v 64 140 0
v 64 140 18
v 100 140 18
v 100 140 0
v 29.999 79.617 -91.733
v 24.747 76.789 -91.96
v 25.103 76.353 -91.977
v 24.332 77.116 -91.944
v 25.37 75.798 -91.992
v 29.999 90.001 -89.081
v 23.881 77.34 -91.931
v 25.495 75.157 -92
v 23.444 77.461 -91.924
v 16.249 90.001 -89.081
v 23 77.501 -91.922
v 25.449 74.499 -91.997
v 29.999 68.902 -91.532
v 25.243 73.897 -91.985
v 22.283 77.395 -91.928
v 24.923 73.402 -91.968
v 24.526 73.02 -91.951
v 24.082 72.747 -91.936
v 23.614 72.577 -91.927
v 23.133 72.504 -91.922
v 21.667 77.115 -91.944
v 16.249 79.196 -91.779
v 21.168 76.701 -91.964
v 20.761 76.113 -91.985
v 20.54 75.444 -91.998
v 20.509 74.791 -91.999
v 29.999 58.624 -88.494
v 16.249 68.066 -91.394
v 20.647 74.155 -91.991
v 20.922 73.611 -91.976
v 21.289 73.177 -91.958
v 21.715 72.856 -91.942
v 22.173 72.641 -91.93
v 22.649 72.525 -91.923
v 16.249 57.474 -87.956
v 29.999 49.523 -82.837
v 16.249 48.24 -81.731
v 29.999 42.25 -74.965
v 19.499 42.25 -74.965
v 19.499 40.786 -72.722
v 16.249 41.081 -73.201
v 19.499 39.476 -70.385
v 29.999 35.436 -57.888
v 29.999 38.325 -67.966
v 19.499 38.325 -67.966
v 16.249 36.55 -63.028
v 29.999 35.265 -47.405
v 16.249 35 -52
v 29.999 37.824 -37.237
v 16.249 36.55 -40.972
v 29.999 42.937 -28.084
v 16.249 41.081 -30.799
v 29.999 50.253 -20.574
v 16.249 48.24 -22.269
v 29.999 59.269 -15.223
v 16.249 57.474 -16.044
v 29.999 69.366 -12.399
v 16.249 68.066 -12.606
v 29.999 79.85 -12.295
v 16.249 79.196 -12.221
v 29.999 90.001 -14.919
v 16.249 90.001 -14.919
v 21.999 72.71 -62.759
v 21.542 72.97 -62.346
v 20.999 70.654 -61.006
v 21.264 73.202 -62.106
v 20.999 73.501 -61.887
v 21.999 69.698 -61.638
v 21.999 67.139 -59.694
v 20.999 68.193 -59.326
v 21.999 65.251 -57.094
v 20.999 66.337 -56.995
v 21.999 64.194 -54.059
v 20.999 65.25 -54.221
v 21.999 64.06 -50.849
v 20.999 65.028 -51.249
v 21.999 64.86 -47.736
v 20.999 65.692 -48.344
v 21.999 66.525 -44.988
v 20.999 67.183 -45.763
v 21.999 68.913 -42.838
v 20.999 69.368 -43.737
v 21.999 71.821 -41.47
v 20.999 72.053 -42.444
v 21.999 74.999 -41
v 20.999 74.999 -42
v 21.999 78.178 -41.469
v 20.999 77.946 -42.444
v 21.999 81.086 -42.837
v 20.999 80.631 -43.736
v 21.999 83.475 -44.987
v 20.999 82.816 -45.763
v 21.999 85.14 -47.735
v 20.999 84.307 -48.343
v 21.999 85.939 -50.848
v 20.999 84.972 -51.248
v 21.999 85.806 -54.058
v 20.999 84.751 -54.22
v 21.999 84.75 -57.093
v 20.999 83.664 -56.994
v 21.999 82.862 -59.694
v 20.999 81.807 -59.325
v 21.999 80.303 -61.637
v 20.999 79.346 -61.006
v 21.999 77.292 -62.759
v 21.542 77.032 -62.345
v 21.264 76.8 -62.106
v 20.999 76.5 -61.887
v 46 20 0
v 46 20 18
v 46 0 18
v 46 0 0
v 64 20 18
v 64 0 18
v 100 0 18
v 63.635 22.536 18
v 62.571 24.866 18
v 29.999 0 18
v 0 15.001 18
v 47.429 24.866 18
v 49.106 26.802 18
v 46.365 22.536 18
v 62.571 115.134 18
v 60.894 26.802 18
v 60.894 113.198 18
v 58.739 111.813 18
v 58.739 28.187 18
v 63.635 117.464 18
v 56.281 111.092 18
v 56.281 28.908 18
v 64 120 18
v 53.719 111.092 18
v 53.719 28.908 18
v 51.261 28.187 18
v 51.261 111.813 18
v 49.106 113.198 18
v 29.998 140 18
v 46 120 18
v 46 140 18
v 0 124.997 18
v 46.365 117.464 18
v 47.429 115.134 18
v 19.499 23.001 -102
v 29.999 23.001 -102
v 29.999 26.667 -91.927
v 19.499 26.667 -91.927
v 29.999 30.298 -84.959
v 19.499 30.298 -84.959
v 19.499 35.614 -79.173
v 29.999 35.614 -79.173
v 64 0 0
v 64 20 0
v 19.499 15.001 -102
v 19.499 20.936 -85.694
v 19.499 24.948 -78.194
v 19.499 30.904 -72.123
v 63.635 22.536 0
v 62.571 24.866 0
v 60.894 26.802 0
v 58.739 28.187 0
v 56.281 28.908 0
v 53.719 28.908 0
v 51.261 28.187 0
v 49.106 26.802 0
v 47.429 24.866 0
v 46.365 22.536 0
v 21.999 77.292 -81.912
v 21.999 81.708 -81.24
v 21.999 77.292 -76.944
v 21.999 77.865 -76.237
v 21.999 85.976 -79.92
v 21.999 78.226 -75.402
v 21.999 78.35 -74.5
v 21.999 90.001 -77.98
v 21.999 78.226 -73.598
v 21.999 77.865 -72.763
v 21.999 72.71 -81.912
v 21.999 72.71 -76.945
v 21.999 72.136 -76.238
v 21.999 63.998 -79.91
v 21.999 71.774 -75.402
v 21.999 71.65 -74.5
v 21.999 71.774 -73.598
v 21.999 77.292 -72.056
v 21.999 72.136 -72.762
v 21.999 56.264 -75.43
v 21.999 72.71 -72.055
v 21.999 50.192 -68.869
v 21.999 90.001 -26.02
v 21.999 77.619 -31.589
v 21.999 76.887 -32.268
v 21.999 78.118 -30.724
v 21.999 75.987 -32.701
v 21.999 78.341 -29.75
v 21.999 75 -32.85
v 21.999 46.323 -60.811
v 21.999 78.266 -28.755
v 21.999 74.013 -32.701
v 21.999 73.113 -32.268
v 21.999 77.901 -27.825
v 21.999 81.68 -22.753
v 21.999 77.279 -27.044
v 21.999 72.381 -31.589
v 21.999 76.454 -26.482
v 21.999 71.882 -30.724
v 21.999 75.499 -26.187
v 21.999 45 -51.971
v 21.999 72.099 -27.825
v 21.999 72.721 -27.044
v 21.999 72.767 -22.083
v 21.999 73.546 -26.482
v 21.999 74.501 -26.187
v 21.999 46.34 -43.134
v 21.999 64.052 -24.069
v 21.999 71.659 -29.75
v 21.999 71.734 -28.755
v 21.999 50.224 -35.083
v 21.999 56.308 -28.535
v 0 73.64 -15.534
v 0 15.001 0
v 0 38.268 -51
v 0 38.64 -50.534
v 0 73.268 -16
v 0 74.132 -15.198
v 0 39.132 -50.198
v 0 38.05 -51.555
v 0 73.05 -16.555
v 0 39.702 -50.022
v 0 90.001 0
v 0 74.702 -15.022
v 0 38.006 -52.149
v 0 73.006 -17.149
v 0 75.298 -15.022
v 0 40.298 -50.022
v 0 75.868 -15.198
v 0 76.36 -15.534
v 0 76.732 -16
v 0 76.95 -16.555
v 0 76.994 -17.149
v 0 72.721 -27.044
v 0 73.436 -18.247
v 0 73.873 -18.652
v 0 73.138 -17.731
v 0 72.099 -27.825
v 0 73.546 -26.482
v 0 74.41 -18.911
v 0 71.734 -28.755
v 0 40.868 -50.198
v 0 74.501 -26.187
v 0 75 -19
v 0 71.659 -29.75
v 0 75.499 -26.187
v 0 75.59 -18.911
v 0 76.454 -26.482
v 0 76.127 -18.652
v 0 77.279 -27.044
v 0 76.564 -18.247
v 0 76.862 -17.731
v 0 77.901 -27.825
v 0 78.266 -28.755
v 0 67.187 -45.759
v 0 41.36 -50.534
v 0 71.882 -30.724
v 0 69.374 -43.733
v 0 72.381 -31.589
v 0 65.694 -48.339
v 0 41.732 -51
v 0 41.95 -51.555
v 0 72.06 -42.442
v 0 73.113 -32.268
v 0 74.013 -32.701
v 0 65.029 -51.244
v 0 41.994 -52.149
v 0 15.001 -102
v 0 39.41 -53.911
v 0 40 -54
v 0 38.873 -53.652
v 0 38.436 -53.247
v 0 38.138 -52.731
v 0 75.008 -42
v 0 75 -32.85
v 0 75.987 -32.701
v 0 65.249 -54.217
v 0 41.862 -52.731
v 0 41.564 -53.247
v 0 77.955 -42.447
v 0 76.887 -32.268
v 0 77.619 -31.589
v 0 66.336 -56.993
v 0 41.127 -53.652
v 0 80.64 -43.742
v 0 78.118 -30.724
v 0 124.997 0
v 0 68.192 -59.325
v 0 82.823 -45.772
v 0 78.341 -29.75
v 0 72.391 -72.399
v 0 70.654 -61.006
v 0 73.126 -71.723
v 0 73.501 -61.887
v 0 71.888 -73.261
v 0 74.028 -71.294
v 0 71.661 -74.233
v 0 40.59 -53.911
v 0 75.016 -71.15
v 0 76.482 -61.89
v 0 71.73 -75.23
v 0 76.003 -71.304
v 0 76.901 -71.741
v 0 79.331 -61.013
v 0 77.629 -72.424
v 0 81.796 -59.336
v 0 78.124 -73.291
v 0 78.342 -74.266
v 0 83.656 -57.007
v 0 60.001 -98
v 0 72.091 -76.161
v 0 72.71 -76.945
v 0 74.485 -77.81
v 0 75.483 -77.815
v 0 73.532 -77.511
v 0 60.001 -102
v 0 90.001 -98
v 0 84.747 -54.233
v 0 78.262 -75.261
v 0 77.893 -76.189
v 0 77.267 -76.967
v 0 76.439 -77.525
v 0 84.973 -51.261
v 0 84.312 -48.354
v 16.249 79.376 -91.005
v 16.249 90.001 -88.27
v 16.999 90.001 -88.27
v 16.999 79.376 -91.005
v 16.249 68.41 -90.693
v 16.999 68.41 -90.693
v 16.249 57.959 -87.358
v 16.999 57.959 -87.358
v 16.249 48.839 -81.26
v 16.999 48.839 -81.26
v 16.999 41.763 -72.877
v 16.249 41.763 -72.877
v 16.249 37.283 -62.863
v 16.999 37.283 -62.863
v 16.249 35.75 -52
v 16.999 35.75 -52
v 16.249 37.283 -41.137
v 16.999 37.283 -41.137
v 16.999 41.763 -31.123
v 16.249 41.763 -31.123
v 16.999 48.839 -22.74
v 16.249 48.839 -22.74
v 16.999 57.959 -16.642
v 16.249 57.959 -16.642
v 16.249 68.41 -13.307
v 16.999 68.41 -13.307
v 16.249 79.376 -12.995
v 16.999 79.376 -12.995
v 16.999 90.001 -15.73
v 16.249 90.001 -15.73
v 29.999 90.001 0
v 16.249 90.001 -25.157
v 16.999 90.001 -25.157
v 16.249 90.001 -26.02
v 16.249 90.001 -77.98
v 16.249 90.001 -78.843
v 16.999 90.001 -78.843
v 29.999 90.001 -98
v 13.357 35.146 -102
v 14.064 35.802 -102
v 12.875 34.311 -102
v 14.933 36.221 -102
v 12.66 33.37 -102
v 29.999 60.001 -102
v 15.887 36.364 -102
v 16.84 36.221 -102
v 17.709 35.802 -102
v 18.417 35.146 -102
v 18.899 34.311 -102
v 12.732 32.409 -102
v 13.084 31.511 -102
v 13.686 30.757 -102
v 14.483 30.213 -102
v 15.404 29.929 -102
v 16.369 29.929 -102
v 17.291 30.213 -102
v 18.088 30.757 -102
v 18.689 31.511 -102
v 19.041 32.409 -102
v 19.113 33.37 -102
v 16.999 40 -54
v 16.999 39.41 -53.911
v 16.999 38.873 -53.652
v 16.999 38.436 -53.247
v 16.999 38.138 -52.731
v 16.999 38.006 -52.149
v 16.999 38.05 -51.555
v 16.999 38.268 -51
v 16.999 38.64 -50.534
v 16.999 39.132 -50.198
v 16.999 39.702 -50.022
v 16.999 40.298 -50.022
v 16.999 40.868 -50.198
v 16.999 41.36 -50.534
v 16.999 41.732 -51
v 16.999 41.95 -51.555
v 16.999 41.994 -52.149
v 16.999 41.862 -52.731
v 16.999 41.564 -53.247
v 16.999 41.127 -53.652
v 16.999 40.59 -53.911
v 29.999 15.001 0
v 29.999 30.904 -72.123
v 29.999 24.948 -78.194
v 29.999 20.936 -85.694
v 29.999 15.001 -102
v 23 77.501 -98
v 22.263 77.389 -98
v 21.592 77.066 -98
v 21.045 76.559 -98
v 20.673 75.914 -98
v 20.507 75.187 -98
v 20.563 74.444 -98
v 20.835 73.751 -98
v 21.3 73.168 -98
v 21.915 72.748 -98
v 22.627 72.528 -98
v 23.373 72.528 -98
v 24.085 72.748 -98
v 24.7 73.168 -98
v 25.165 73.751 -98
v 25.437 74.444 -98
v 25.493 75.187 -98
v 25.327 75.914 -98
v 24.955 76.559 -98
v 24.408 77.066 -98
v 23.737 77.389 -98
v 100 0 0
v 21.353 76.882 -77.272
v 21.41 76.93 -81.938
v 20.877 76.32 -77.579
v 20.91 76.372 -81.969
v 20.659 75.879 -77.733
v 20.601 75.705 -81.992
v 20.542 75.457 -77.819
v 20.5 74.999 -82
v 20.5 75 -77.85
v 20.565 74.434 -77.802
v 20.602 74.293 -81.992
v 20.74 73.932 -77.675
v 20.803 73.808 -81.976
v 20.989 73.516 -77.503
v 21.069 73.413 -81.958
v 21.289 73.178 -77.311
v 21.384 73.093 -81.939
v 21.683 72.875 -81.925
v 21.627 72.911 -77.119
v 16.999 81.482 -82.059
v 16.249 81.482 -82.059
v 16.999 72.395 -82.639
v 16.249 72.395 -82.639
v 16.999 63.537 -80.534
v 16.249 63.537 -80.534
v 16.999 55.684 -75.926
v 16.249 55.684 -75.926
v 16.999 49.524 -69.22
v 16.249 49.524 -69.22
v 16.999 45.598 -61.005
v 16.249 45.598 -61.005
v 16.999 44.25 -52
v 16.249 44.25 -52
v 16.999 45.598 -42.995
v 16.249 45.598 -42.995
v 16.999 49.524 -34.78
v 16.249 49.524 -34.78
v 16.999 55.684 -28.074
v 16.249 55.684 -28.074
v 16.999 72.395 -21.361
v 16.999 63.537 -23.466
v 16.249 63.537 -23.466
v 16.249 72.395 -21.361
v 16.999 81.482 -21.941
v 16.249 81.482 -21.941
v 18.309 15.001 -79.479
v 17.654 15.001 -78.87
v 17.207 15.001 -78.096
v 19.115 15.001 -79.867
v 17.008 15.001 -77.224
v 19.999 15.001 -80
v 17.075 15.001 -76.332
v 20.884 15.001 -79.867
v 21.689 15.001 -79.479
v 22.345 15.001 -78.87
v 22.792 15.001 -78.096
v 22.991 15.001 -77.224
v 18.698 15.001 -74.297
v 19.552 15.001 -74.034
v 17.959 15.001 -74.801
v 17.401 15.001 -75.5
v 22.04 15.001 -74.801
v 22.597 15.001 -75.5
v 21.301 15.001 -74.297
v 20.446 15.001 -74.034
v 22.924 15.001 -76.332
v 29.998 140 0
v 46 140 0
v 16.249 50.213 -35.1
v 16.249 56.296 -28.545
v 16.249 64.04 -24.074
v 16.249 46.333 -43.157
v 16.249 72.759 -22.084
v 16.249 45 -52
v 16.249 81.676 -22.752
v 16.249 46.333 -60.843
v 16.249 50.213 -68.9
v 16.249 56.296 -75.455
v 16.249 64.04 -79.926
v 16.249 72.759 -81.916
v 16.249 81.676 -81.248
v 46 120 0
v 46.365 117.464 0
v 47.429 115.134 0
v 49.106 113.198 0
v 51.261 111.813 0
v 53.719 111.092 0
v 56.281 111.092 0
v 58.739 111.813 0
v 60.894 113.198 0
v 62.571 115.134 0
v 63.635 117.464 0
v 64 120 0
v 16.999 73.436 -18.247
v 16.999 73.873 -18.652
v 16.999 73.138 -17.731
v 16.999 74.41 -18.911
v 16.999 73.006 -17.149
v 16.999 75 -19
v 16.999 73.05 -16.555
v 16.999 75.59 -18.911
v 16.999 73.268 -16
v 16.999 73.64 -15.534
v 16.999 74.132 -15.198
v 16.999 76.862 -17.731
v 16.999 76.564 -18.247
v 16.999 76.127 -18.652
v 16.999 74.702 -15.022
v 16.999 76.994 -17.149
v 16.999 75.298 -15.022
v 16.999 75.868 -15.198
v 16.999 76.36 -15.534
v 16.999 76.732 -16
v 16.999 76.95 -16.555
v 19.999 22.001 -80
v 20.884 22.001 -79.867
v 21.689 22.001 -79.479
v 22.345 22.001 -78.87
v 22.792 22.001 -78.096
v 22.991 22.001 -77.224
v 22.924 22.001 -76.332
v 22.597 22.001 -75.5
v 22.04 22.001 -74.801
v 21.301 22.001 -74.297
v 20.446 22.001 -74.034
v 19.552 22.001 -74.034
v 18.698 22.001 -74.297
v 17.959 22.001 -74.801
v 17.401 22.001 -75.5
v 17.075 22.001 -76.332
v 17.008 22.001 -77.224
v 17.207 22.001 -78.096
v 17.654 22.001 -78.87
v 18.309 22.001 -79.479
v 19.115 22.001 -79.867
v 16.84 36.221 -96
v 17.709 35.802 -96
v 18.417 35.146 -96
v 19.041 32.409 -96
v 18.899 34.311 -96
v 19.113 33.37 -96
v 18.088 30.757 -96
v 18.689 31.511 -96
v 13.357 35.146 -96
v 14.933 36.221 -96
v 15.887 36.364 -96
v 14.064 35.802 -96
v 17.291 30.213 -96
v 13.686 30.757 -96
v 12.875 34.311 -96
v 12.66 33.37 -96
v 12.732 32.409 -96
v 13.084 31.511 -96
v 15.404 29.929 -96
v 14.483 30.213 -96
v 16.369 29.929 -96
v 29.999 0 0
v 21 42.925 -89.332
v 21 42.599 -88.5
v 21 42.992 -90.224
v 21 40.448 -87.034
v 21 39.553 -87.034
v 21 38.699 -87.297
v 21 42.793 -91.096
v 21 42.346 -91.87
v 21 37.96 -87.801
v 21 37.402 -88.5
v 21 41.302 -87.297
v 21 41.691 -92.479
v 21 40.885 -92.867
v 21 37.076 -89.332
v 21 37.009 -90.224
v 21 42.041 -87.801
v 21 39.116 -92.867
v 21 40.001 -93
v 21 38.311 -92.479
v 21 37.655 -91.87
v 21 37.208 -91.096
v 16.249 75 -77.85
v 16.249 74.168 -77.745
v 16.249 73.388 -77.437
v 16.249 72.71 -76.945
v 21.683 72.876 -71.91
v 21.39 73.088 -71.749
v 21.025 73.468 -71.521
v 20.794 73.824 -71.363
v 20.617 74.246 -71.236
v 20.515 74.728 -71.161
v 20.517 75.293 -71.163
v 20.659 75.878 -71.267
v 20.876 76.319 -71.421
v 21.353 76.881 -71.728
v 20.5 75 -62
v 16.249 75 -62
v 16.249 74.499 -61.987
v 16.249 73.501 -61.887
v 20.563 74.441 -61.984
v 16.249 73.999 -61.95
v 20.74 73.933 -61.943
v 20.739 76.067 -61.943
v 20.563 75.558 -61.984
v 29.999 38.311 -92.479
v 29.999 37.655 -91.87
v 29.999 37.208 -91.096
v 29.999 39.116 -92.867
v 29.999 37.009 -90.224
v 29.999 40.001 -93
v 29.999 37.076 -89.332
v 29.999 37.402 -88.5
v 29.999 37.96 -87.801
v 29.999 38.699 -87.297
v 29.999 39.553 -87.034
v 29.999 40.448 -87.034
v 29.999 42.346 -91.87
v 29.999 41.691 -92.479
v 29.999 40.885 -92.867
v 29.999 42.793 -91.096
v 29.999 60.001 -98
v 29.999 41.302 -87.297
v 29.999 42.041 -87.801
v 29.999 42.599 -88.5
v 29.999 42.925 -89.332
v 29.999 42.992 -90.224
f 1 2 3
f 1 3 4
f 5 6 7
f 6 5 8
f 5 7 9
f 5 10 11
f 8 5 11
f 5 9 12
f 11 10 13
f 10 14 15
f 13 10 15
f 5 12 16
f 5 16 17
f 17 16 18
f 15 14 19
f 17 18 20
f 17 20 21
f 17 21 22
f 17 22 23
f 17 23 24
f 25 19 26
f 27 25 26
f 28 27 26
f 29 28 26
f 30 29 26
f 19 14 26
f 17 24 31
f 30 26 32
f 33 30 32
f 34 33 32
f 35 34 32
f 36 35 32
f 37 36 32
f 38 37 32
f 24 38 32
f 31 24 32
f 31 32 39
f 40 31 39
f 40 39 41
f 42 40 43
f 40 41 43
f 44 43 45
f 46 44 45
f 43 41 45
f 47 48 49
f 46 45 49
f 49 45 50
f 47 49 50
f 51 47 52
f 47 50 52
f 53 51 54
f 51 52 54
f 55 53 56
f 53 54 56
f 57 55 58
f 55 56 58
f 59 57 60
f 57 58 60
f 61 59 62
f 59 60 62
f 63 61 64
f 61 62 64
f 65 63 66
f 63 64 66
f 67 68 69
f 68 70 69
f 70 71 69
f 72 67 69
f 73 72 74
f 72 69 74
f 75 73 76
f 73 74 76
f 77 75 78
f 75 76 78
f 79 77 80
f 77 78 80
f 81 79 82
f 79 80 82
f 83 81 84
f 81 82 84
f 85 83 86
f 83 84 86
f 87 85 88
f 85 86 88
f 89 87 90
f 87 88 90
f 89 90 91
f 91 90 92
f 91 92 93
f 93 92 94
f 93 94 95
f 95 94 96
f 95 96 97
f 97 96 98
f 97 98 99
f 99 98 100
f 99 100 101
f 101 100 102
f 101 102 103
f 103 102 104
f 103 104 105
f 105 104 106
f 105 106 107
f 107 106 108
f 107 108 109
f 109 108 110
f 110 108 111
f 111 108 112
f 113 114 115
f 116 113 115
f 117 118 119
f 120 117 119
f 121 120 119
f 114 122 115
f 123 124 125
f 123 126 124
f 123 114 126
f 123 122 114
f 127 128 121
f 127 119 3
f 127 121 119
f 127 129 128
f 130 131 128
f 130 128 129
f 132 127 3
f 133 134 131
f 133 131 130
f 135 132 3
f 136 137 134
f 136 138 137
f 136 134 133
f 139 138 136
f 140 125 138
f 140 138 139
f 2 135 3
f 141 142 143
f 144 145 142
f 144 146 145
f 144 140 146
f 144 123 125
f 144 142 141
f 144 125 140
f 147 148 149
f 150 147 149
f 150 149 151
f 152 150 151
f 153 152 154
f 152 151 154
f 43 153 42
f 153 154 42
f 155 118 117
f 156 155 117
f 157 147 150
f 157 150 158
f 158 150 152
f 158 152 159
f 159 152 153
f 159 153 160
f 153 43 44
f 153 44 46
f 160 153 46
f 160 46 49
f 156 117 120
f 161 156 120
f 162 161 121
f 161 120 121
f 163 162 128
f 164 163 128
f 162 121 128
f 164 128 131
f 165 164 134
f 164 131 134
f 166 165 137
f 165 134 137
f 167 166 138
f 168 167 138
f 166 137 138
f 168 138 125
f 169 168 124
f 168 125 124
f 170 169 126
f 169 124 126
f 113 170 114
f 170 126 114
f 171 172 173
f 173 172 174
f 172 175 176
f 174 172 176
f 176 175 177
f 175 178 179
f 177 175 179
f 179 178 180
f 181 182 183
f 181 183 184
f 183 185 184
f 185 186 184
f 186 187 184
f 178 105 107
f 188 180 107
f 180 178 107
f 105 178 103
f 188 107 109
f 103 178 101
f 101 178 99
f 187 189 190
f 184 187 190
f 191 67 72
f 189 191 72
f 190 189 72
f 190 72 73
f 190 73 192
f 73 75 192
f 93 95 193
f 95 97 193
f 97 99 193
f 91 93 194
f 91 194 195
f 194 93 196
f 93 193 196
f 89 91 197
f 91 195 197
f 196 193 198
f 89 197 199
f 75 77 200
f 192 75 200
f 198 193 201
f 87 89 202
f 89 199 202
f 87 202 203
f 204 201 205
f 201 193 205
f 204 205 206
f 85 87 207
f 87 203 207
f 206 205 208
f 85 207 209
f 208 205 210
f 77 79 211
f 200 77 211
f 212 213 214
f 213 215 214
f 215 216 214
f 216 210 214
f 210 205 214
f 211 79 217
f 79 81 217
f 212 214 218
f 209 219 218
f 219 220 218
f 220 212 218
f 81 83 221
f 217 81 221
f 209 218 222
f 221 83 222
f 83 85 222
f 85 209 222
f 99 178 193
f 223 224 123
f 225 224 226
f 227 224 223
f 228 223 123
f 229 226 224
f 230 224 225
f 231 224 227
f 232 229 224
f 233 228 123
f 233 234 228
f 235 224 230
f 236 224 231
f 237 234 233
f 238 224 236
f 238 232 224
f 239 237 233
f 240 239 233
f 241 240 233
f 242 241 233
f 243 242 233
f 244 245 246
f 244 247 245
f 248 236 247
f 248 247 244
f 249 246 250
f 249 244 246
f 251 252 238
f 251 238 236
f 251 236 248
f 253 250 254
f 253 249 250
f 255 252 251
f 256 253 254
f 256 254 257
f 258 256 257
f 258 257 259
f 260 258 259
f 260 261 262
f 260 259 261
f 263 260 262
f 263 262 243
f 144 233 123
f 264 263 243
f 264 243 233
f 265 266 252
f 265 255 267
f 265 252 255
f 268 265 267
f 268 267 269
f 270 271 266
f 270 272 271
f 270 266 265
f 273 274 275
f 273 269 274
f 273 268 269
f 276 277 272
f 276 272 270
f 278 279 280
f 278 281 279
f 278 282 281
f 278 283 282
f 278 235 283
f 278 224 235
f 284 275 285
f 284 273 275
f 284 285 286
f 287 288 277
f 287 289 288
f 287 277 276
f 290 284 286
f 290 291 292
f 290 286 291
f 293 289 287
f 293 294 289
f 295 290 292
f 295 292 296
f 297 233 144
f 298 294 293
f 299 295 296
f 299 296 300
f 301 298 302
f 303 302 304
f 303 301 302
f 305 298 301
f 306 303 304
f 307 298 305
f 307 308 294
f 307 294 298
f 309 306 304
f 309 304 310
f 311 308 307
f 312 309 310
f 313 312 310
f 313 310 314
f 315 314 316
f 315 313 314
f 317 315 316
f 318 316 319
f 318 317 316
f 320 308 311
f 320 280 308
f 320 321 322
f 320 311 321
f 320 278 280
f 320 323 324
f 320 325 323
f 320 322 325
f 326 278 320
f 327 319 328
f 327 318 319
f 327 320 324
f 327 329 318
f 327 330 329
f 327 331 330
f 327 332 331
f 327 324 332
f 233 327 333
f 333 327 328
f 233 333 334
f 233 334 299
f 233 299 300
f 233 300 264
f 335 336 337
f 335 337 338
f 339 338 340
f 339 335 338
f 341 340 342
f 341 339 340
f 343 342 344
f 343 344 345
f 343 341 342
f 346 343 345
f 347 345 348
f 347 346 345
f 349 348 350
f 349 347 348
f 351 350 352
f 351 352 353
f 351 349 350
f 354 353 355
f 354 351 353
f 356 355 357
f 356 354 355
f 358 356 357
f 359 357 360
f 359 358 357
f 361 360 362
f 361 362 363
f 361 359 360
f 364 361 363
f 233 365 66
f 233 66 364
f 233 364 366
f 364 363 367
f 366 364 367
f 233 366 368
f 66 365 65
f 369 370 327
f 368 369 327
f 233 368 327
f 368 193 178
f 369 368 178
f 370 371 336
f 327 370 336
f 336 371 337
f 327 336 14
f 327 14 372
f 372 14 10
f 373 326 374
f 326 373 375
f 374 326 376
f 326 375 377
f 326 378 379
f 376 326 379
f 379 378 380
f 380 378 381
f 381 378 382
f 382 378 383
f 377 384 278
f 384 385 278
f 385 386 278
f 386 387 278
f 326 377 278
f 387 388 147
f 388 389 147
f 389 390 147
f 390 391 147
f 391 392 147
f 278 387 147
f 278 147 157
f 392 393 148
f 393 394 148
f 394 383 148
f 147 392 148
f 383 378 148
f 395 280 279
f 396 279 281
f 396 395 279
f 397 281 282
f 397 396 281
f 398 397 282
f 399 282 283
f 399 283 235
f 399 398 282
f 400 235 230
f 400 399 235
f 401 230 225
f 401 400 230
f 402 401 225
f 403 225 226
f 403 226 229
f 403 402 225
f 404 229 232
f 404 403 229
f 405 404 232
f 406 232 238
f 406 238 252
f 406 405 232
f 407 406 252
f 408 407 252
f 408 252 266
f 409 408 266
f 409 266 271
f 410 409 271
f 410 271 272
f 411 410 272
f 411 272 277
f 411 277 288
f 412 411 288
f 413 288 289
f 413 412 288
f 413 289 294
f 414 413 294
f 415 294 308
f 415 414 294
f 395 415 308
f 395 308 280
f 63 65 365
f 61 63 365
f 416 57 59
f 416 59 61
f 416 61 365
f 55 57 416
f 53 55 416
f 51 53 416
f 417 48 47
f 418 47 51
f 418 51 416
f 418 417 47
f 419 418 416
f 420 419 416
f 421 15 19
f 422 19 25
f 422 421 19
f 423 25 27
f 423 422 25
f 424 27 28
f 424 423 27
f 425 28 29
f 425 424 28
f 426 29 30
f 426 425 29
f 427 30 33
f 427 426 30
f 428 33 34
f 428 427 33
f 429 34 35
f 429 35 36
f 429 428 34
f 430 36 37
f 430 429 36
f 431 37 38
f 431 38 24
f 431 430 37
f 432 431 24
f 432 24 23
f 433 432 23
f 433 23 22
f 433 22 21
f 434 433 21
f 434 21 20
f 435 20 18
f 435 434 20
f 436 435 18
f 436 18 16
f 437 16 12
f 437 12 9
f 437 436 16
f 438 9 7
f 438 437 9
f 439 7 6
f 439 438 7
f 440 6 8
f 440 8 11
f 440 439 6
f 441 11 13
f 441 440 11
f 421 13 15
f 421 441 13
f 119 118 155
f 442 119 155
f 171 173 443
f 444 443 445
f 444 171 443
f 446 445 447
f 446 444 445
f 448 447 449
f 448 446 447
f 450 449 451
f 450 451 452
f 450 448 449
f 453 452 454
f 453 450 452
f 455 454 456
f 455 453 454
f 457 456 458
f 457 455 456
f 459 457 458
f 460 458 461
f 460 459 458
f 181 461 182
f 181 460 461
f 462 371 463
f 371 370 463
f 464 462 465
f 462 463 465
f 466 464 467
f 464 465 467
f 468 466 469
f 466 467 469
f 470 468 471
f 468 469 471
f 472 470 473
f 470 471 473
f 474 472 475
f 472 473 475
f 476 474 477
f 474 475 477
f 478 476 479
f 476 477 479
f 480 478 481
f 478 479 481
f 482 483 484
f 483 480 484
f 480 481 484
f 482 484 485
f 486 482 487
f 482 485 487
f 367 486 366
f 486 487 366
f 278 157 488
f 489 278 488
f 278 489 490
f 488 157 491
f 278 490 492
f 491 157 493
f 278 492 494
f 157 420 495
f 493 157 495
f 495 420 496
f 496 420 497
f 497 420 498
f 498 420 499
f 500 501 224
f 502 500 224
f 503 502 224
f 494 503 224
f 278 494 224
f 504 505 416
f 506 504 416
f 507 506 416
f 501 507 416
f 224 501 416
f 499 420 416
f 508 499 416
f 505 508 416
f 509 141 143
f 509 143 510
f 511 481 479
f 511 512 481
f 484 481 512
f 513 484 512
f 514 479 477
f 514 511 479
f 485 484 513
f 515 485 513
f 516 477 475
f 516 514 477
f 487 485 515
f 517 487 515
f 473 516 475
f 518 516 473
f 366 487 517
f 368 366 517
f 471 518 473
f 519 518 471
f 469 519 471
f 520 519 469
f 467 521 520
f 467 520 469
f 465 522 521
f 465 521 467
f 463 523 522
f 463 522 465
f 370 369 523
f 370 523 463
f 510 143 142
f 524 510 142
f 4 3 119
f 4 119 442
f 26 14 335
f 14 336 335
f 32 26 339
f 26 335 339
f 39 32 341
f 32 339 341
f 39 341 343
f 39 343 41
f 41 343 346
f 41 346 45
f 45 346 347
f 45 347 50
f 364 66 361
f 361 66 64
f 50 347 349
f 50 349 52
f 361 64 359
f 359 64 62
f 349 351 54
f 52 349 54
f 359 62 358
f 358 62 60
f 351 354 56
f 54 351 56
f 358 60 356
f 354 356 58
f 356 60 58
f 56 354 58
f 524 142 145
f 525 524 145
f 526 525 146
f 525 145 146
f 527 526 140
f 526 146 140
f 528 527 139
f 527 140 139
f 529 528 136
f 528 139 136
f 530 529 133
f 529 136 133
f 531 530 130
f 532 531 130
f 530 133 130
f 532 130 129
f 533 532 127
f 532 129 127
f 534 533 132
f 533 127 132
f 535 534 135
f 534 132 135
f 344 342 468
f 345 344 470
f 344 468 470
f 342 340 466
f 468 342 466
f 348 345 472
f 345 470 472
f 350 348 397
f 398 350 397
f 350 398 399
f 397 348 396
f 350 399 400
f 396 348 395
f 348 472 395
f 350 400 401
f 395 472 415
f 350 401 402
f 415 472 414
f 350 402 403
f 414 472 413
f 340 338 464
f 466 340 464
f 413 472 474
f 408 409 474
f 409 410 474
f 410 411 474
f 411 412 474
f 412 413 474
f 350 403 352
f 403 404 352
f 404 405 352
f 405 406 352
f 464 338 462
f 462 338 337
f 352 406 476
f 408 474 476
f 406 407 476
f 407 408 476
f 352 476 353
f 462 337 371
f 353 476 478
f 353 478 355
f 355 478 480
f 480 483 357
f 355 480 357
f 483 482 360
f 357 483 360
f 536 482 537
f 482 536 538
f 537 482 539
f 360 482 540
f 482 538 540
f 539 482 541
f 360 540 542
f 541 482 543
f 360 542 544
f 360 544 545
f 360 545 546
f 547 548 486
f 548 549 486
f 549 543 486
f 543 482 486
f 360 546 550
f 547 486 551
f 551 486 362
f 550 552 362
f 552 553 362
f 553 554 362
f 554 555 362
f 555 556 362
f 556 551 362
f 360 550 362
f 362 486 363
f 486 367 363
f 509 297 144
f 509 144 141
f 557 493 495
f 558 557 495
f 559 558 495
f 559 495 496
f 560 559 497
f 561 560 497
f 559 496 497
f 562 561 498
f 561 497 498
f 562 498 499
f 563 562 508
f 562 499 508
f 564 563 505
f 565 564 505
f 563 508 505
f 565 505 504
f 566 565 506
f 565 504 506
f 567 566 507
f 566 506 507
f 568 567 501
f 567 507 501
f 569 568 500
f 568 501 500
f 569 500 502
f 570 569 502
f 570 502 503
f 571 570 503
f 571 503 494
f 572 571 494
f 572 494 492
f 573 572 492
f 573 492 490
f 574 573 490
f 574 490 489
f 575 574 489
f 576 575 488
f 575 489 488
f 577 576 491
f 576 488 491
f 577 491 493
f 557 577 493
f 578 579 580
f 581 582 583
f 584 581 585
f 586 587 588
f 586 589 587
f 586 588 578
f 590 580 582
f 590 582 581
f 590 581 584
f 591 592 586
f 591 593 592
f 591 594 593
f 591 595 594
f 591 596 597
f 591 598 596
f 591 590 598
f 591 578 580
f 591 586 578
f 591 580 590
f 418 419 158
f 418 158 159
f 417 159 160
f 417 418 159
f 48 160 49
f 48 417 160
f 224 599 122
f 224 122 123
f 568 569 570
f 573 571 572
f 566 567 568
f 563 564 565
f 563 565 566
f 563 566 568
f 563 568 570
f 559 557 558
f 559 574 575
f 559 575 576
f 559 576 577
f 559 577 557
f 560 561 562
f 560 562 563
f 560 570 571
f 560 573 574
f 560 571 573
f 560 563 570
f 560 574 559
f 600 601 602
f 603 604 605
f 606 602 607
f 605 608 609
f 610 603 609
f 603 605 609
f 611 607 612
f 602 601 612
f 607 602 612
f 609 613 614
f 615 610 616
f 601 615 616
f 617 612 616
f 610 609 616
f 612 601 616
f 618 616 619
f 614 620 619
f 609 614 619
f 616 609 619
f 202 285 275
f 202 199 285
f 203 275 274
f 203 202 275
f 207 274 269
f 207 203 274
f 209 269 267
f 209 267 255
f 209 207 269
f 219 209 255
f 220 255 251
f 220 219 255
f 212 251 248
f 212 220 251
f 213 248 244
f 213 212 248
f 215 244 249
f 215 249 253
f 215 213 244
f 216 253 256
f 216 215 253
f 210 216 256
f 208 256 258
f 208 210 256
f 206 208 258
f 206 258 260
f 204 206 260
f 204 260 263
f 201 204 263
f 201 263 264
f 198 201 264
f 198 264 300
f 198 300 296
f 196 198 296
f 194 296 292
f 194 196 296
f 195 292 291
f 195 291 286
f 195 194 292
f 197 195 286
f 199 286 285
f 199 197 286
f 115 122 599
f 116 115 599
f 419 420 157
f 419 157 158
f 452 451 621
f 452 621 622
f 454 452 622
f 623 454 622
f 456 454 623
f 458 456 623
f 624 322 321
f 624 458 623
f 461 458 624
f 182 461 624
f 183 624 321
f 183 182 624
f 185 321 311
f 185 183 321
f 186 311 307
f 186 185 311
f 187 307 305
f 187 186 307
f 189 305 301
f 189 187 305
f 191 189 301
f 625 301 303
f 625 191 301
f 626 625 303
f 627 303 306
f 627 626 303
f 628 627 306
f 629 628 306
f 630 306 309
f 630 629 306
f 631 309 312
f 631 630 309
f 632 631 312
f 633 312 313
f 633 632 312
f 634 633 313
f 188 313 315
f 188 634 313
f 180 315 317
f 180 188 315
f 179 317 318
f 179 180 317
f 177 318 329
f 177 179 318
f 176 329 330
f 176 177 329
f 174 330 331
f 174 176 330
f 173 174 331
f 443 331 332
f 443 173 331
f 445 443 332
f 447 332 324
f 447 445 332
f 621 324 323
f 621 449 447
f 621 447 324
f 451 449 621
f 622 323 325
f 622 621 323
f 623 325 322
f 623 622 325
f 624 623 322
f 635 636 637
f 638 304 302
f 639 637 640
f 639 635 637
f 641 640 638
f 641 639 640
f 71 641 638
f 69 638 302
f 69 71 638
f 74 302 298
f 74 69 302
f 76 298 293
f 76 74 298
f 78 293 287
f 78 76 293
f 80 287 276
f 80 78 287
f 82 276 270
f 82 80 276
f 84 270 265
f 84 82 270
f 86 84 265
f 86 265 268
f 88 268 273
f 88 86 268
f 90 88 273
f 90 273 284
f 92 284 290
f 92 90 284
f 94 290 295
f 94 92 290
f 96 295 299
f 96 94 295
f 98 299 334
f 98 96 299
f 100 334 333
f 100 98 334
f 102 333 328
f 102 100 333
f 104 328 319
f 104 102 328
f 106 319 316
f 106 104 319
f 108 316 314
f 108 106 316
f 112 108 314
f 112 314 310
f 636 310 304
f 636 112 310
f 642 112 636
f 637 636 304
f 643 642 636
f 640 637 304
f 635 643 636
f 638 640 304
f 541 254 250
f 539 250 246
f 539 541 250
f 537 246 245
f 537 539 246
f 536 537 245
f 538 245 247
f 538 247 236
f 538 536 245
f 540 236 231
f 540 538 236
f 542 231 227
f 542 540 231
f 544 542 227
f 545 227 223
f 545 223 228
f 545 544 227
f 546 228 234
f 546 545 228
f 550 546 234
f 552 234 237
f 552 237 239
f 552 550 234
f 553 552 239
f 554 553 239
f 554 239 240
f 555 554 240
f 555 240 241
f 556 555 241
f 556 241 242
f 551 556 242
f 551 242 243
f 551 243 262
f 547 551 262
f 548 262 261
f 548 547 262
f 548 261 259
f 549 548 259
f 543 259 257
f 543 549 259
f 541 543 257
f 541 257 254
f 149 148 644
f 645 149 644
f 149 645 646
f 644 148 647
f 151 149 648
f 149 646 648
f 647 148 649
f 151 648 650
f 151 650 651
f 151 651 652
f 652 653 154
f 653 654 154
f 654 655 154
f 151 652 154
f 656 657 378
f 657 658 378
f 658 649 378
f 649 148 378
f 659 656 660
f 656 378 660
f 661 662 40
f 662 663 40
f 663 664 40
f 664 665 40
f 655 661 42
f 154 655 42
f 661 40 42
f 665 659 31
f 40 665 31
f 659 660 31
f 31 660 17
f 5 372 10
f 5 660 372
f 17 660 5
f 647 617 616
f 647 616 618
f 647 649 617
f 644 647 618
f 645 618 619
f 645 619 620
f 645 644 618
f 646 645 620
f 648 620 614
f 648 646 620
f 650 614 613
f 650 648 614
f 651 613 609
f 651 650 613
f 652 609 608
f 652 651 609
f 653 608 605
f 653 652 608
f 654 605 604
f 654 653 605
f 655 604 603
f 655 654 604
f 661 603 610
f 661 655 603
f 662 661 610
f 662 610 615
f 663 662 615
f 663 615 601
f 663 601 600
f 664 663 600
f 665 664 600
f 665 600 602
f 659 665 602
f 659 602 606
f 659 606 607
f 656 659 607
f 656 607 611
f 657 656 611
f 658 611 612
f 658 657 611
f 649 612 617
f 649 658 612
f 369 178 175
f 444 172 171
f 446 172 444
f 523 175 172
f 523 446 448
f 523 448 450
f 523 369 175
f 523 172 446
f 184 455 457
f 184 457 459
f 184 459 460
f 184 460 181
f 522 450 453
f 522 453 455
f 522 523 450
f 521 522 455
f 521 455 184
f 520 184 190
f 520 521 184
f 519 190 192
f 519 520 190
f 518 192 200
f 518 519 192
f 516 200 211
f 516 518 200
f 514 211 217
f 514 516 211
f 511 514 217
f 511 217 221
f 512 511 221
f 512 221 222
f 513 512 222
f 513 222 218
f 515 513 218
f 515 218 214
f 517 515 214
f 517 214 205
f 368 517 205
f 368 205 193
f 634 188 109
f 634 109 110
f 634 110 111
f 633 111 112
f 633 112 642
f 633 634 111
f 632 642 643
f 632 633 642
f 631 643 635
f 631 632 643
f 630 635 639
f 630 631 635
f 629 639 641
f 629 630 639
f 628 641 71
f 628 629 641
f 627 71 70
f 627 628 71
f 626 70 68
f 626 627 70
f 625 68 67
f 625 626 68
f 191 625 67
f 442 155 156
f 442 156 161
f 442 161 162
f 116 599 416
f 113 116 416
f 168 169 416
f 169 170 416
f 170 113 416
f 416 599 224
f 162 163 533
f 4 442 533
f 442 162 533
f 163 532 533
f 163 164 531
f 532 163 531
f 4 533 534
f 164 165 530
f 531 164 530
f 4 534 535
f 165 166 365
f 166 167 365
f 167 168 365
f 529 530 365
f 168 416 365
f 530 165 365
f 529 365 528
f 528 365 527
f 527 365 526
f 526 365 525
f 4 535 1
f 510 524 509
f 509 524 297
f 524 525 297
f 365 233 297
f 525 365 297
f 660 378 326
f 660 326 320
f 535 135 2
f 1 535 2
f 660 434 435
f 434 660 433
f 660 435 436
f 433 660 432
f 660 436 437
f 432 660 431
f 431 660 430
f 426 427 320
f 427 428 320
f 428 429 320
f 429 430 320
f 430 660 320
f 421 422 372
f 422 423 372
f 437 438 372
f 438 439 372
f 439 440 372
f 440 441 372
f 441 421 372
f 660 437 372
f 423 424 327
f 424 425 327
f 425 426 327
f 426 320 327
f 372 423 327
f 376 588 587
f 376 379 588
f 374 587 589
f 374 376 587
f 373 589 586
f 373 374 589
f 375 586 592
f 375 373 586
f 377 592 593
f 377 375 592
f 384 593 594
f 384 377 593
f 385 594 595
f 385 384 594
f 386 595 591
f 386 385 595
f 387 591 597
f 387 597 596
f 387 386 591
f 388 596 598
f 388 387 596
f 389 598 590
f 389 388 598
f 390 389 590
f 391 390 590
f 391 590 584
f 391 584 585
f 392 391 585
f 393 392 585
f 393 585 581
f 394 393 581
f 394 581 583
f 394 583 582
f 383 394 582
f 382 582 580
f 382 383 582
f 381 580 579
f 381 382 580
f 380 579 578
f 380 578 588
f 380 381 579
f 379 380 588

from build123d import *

# Parameters (mm, degrees)
EXTRUDE_1_DEPTH                  = 10.5
SKETCH_2_W                       = 102.00000000000001
SKETCH_2_H                       = 75.00000000000009
EXTRUDE_2_DEPTH                  = 19.4993693487819
EXTRUDE_3_DEPTH                  = 18.000000000000004
SKETCH_4_W                       = 18.000000000000004
SKETCH_4_H                       = 140
EXTRUDE_4_DEPTH                  = 70.0006306512181
EXTRUDE_START                    = 10.499999999999998
EXTRUDE_5_DEPTH                  = 10.499999999999998
CUT_EXTRUDE_1_REACH              = 194.401
SKETCH_7_W                       = 4.000000000000014
SKETCH_7_H                       = 29.999999999999993
CUT_EXTRUDE_2_DEPTH              = 201.0099997500125
CUT_EXTRUDE_3_DEPTH              = 210.76176963403032
CUT_EXTRUDE_4_DEPTH              = 210.76176963403032
EXTRUDE_6_DEPTH                  = 0.7500000000000007
HOLE_WIZARD_M521_D               = 61.5
EXTRUDE_7_DEPTH                  = 5.749999999999998
HOLE_WIZARD_6_7_6_7_1_AT_2_COUNT = 2
HOLE_WIZARD_6_7_6_7_1_AT_2_PITCH = 45
HOLE_WIZARD_4_0_4_1_AT_2_COUNT   = 2
HOLE_WIZARD_4_0_4_1_AT_2_PITCH   = 49.49747468305833
CHAMFER_1_SIZE                   = 0.9999999999999991
EXTRUDE_START_2                  = -16.249369
SKETCH_28_R                      = 3.35
SKETCH_28_R_2                    = 9.999999999999993
SKETCH_28_R_3                    = 3.350000000000003
EXTRUDE_8_DEPTH                  = 16.249369
SKETCH_30_R                      = 3.0000000000000018
CUT_EXTRUDE_5_DEPTH              = 7
EXTRUDE_START_3                  = -21.000000000000007
SKETCH_32_R                      = 2.9999999999999933
EXTRUDE_9_DEPTH                  = 21.000000000000007


with BuildPart() as part:
    # Эскиз1 → Бобышка-Вытянуть1 (new body)
    with BuildSketch(Plane(origin=(29.9993693487819, 0, 0), x_dir=(0, 0, -1), z_dir=(1, 0, 0))):
        with BuildLine():
            Line((14.919229074297327, 90.0005475751909), (0, 90.0005475751909))
            Line((0, 90.0005475751909), (0, 15.0005475751908))
            Line((0, 15.0005475751908), (102.00000000000001, 15.0005475751908))
            Line((102.00000000000001, 15.0005475751908), (85.69382268537409, 20.93551075238141))
            ThreePointArc((85.69382268537409, 20.93551075238141), (74.94644857866616, 27.70982740688085), (67.9664449575318, 38.324768093192546))
            ThreePointArc((67.9664449575318, 38.324768093192546), (24.088528585175357, 46.3477790832992), (14.919229074297327, 90.0005475751909))
        make_face()
    extrude(amount=-EXTRUDE_1_DEPTH)

    # Эскиз2 → Бобышка-Вытянуть2 (add)
    with BuildSketch(Plane.ZY.offset(-19.4993693487819)):
        with Locations((-51.00000000000001, 52.50054757519085)):
            Rectangle(SKETCH_2_W, SKETCH_2_H)
    extrude(amount=EXTRUDE_2_DEPTH)

    # Эскиз3 → Бобышка-Вытянуть3 (add)
    with BuildSketch(Plane.XY):
        Polygon((29.999369348781915, -6.94e-15), (3.47e-15, 15.000547575190799), (0, 124.997494914823), (29.997641385548, 140), (29.999369348781904, 140), align=None)
    extrude(amount=EXTRUDE_3_DEPTH)

    # Эскиз4 → Бобышка-Вытянуть4 (add)
    with BuildSketch(Plane(origin=(29.9993693487819, 0, 0), x_dir=(0, 0, -1), z_dir=(1, 0, 0))):
        with Locations((-9.000000000000002, 70)):
            Rectangle(SKETCH_4_W, SKETCH_4_H)
    extrude(amount=EXTRUDE_4_DEPTH)

    # Эскиз5 → Бобышка-Вытянуть5 (add)
    with BuildSketch(Plane(origin=(19.4993693487819, 0, 0), x_dir=(0, 0, -1), z_dir=(1, 0, 0)).offset(EXTRUDE_START)):
        with BuildLine():
            Line((89.08077092570272, 90.0005475751909), (102.00000000000001, 90.0005475751909))
            Line((102.00000000000001, 90.0005475751909), (102.00000000000001, 23.000547575190808))
            Line((102.00000000000001, 23.000547575190808), (91.92678266011816, 26.666898850201964))
            ThreePointArc((91.92678266011816, 26.666898850201964), (81.8910585435448, 32.765618882150974), (74.9654117449494, 42.24958224106233))
            ThreePointArc((74.9654117449494, 42.24958224106233), (90.35915387380979, 63.660894475956894), (89.08077092570272, 90.0005475751909))
        make_face()
    extrude(amount=-EXTRUDE_5_DEPTH)

    # Эскиз6 → Вырез-Вытянуть1 (cut, up to next)
    with BuildSketch(Plane(origin=(16.2493693487819, 0, 0), x_dir=(0, -1, 0), z_dir=(-1, 0, 0)), mode=Mode.PRIVATE) as cut_extrude_1_sk1:
        with BuildLine():
            Line((-90.0005475751909, -14.919229074297327), (-90.0005475751909, -89.08077092570272))
            ThreePointArc((-90.0005475751909, -89.08077092570272), (-34.999999999999936, -52), (-90.0005475751909, -14.919229074297327))
        make_face()
    cut_extrude_1_tool1 = extrude(cut_extrude_1_sk1.sketch, amount=-CUT_EXTRUDE_1_REACH, mode=Mode.PRIVATE) & part.part
    add(cut_extrude_1_tool1.solids().sort_by_distance((16.249369, 65.774947, -52))[0], mode=Mode.SUBTRACT)

    # Эскиз7 → Вырез-Вытянуть2 (cut, through all)
    with BuildSketch(Plane.ZY):
        with Locations((-100, 75.0005475751909)):
            Rectangle(SKETCH_7_W, SKETCH_7_H)
    extrude(amount=-CUT_EXTRUDE_2_DEPTH, mode=Mode.SUBTRACT)

    # Эскиз8 → Вырез-Вытянуть3 (cut, through all)
    with BuildSketch(Plane.XY.offset(18.000000000000004)):
        with BuildLine():
            Line((64, 140), (45.999999999999986, 140))
            Line((45.999999999999986, 140), (46, 120))
            ThreePointArc((46, 120), (55, 111), (64, 120))
            Line((64, 120), (64, 140))
        make_face()
    extrude(amount=-CUT_EXTRUDE_3_DEPTH, mode=Mode.SUBTRACT)

    # Эскиз9 → Вырез-Вытянуть4 (cut, through all)
    with BuildSketch(Plane.XY.offset(18.000000000000004)):
        with BuildLine():
            Line((46.00000000000001, 0), (64, 0))
            Line((64, 0), (64, 20.000000000000004))
            ThreePointArc((64, 20.000000000000004), (55, 29), (45.999999999999986, 20.000000000000004))
            Line((45.999999999999986, 20.000000000000004), (46.00000000000001, 0))
        make_face()
    extrude(amount=-CUT_EXTRUDE_4_DEPTH, mode=Mode.SUBTRACT)

    # Эскиз10 → Бобышка-Вытянуть6 (add)
    with BuildSketch(Plane(origin=(16.2493693487819, 0, 0), x_dir=(0, 0, -1), z_dir=(1, 0, 0))):
        with BuildLine():
            Line((15.729542704227807, 90.0005475751909), (88.27045729577222, 90.00054757519085))
            ThreePointArc((88.27045729577222, 90.00054757519085), (51.999999999999986, 35.75000000000001), (15.729542704227807, 90.0005475751909))
        make_face()
    extrude(amount=EXTRUDE_6_DEPTH)

    # Отверстие с зазором M521 (through all)
    with Locations(Plane(origin=(16.999369348781904, 0, 0), x_dir=(0, 0, -1), z_dir=(1, 0, 0))):
        with Locations((52, 75)):
            Hole(HOLE_WIZARD_M521_D / 2)

    # Эскиз20 → Диаметр отверстия Ø4.0 (4)1 (revolve, cut)
    with BuildSketch(Plane(origin=(16.999369348781904, 75, -17), x_dir=(0, 0, -1), z_dir=(0, 1, 0))):
        Polygon((0, 0), (-4.16e-15, 16.999369348781904), (1.9999999999999978, 16.999369348781904), (1.9999999999999896, -1.31e-15), align=None)
    hole_wizard_4_0_4_1 = revolve(axis=Axis((23.349369348781895, 75, -17), (-1, 0, 0)), mode=Mode.SUBTRACT)

    # Диаметр отверстия Ø4.0 (4)1 at 2: Диаметр отверстия Ø4.0 (4)1 ×2
    with Locations(*[Vector(0, -0.7071067811865475, -0.7071067811865477) * (i * HOLE_WIZARD_4_0_4_1_AT_2_PITCH) for i in range(1, HOLE_WIZARD_4_0_4_1_AT_2_COUNT)]):
        add(hole_wizard_4_0_4_1, mode=Mode.SUBTRACT)

    # Эскиз22 → Диаметр отверстия Ø6.0 (6)1 (revolve, cut)
    with BuildSketch(Plane(origin=(29.9993693487819, 40.0005475751908, -90), x_dir=(0, 0, -1), z_dir=(0, 1, 0))):
        Polygon((0, 0), (-7.35e-15, 30.000369348781906), (2.9999999999999867, 30.000369348781906), (2.9999999999999907, -1.19e-15), align=None)
    revolve(axis=Axis((36.34936934878189, 40.0005475751908, -90), (-1, 0, 0)), mode=Mode.SUBTRACT)


with BuildPart() as body_2:
    # Эскиз13 → Бобышка-Вытянуть7 (new body)
    with BuildSketch(Plane(origin=(16.2493693487819, 0, 0), x_dir=(0, -1, 0), z_dir=(-1, 0, 0))):
        with BuildLine():
            Line((-90.0005475751909, -26.01955403684463), (-90.0005475751909, -77.98044596315543))
            ThreePointArc((-90.0005475751909, -77.98044596315543), (-44.99999999999993, -51.99999999999999), (-90.0005475751909, -26.01955403684463))
        make_face()
    extrude(amount=-EXTRUDE_7_DEPTH)

    # Эскиз16 → Диаметр отверстия Ø6.7 (6.7)1 (revolve, cut)
    with BuildSketch(Plane(origin=(21.9993693487819, 75, -74.5), x_dir=(0, 0, -1), z_dir=(0, 1, 0))):
        Polygon((0, 0), (-1.41e-15, 5.7509999999999994), (3.3500000000000045, 5.7509999999999994), (3.3499999999999934, -1.15e-15), align=None)
    hole_wizard_6_7_6_7_1 = revolve(axis=Axis((28.34936934878189, 75, -74.5), (-1, 0, 0)), mode=Mode.SUBTRACT)

    # Диаметр отверстия Ø6.7 (6.7)1 at 2: Диаметр отверстия Ø6.7 (6.7)1 ×2
    with Locations(*[(0, 0, i * HOLE_WIZARD_6_7_6_7_1_AT_2_PITCH) for i in range(1, HOLE_WIZARD_6_7_6_7_1_AT_2_COUNT)]):
        add(hole_wizard_6_7_6_7_1, mode=Mode.SUBTRACT)

    # Эскиз18 → Диаметр отверстия Ø20.0 (20)1 (revolve, cut)
    with BuildSketch(Plane(origin=(21.9993693487819, 75, -52.00000000000001), x_dir=(0, 0, -1), z_dir=(0, 1, 0))):
        Polygon((0, 0), (-1.41e-15, 5.7510000000000066), (9.99999999999999, 5.7510000000000066), (9.99999999999999, -3.3e-16), align=None)
    revolve(axis=Axis((28.34936934878189, 75, -52.00000000000001), (-1, 0, 0)), mode=Mode.SUBTRACT)


with BuildPart() as hole_wizard_5_0_5_1_tool:
    # Эскиз24 → Диаметр отверстия Ø5.0 (5)1 (revolve)
    with BuildSketch(Plane(origin=(23, 75.0005475751909, -98), x_dir=(0, 1, 0), z_dir=(1, 0, 0))):
        Polygon((0, 0), (-1.127e-14, 45.999999999999986), (2.499999999999981, 45.999999999999986), (2.4999999999999867, -1.25e-15), align=None)
    revolve(axis=Axis((23, 75.0005475751909, -104.35), (0, 0, 1)))


with BuildPart() as part_1:
    add(part.part)

    # Диаметр отверстия Ø5.0 (5)1: cut by hole_wizard_5_0_5_1_tool
    add(hole_wizard_5_0_5_1_tool.part, mode=Mode.SUBTRACT)

    # Эскиз26 → Отверстие с зазором M61 (revolve, cut)
    with BuildSketch(Plane(origin=(15.8866729980809, 33.128633292951, -102.00000000000001), x_dir=(0, 1, 0), z_dir=(1, 0, 0))):
        Polygon((0, 0), (-1.47e-15, 5.999999999999993), (3.2357711959407984, 6.000000000000005), (3.2357711959408, -1.16e-15), align=None)
    revolve(axis=Axis((15.8866729980809, 33.128633292951, -108.35000000000001), (0, 0, 1)), mode=Mode.SUBTRACT)


with BuildPart() as body_2_1:
    add(body_2.part)

    # Диаметр отверстия Ø5.0 (5)1: cut by hole_wizard_5_0_5_1_tool
    add(hole_wizard_5_0_5_1_tool.part, mode=Mode.SUBTRACT)

    # Фаска1
    chamfer_1_edges = [body_2_1.edges().sort_by_distance(p)[0] for p in [
        (21.9993693487819, 74.99943746278025, -42.00000001582242),
    ]]
    chamfer(chamfer_1_edges, length=CHAMFER_1_SIZE)


with BuildPart() as extrude_8_tool:
    # Эскиз28 → Бобышка-Вытянуть8 (new body)
    with BuildSketch(Plane.ZY.offset(EXTRUDE_START_2)):
        with BuildLine():
            Line((-78.84298926059529, 90.0005475751909), (-25.157010739404722, 90.0005475751909))
            ThreePointArc((-25.157010739404722, 90.0005475751909), (-52.000000000000014, 44.250000000000014), (-78.84298926059529, 90.0005475751909))
        make_face()
        with Locations(Location((-29.500000000000004, 75, 0), (0, 0, 180))):
            Circle(SKETCH_28_R, mode=Mode.SUBTRACT)
        with Locations(Location((-52.00000000000001, 75, 0), (0, 0, 188.618876561))):
            Circle(SKETCH_28_R_2, mode=Mode.SUBTRACT)
        with Locations(Location((-74.5, 75, 0), (0, 0, 223.135094042))):
            Circle(SKETCH_28_R_3, mode=Mode.SUBTRACT)
    extrude(amount=EXTRUDE_8_DEPTH)


with BuildPart() as part_2:
    add(part_1.part)


with BuildPart() as part_3:
    # Бобышка-Вытянуть8: joined with extrude_8_tool
    add(part_2.part.fuse(extrude_8_tool.part, body_2_1.part, tol=0.00001))

    # Эскиз30 → Вырез-Вытянуть5 (cut)
    with BuildSketch(Plane.XZ.offset(-15.0005475751908)):
        with Locations(Location((19.9993693487819, -77.00000000000001, 0), (0, 0, 270))):
            Circle(SKETCH_30_R)
    extrude(amount=-CUT_EXTRUDE_5_DEPTH, mode=Mode.SUBTRACT)

    # Эскиз32 → Бобышка-Вытянуть9 (add)
    with BuildSketch(Plane.ZY.offset(EXTRUDE_START_3)):
        with Locations(Location((-90, 40.0005475751908, 0), (0, 0, 180))):
            Circle(SKETCH_32_R)
    extrude(amount=EXTRUDE_9_DEPTH)


solid = part_3.part
